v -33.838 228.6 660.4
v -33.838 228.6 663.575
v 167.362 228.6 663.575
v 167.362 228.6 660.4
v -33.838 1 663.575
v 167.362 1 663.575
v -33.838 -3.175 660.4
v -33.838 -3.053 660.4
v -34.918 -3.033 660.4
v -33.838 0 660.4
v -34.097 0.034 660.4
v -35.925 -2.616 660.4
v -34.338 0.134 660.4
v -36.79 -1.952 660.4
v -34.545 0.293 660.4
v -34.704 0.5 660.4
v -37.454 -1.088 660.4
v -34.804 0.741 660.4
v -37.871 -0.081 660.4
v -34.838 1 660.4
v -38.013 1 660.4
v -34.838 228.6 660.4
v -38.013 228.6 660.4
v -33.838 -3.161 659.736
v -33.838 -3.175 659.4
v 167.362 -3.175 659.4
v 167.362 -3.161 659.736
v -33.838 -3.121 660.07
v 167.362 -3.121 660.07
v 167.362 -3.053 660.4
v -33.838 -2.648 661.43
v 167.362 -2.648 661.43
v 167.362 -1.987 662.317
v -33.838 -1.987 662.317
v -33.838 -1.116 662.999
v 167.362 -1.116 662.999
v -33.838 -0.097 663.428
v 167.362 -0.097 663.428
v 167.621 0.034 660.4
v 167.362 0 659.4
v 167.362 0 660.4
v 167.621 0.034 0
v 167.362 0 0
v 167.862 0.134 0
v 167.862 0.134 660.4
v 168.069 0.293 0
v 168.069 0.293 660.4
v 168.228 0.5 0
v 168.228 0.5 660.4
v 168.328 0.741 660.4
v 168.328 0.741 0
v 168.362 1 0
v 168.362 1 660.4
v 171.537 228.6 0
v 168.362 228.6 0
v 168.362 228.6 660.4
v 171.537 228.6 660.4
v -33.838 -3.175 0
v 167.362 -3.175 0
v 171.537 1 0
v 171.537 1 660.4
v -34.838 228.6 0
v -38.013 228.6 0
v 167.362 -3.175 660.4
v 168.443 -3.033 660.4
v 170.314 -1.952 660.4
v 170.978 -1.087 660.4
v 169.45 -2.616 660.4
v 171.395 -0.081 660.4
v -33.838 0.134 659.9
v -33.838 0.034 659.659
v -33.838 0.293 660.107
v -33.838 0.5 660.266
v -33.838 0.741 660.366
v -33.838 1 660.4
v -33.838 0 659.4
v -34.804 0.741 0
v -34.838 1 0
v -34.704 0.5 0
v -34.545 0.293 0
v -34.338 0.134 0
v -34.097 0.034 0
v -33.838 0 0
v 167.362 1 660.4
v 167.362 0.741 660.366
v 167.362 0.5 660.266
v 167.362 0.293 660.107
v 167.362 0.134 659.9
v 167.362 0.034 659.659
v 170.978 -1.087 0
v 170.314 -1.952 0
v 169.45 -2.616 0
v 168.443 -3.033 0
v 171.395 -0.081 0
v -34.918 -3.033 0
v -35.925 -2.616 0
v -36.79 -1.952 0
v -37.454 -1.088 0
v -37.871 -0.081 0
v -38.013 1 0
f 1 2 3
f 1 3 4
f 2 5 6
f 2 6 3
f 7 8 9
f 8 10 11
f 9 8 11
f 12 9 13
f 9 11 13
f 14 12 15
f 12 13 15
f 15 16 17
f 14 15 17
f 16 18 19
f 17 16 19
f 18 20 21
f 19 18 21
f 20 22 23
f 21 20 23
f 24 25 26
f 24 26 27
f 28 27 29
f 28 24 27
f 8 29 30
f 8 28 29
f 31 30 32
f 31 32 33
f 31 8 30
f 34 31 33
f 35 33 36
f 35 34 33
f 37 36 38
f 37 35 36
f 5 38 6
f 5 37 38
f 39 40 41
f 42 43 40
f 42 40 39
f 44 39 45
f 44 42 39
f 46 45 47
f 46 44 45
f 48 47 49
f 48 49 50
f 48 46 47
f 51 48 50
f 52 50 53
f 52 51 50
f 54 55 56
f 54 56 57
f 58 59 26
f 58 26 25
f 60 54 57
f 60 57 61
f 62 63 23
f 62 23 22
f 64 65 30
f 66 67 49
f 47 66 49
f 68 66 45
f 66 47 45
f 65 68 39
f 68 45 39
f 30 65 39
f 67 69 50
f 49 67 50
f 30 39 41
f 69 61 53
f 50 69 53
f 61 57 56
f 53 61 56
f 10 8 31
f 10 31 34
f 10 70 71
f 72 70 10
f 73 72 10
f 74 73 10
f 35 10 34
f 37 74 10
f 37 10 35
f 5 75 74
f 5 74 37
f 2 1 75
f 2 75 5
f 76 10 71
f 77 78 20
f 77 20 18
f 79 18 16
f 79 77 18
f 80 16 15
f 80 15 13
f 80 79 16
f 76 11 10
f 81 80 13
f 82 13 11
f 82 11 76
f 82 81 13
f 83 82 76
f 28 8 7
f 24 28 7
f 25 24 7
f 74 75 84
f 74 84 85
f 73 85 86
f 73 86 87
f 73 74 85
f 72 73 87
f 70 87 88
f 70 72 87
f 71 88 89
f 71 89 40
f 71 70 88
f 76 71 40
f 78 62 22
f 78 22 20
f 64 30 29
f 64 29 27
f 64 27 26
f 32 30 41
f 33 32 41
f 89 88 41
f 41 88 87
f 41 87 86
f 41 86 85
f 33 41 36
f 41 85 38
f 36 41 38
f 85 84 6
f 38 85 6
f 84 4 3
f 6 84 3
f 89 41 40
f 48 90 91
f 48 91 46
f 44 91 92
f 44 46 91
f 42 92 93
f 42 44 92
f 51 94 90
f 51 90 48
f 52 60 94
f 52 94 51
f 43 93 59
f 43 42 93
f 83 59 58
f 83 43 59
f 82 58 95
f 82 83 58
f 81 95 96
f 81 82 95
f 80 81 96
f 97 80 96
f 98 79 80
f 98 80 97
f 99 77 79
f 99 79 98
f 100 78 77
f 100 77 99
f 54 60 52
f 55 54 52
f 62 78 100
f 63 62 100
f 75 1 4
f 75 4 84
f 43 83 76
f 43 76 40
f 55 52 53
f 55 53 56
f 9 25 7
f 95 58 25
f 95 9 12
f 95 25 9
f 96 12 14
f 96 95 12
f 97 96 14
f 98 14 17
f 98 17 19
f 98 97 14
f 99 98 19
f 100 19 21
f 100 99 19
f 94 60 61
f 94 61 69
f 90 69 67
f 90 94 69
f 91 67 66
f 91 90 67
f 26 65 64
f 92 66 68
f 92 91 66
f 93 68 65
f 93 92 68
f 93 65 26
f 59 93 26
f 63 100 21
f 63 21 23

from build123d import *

# Parameters (mm, degrees)
BASE_FLANGE1_DEPTH           = 660.4
EDGE_FLANGE1_STRIP_W         = 14.7
EDGE_FLANGE1_STRIP_H         = 3.175
EDGE_FLANGE1_STRIP_CUT_DEPTH = 201.2
EDGE_FLANGE1_DEPTH           = 201.2


# Sheet-metal steps are written as plain solids
with BuildPart() as part:
    # Sketch1 → Base-Flange1 (new body)
    with BuildSketch(Plane.XY):
        with BuildLine():
            Line((-34.837852286, 228.6), (-34.837852286, 1))
            ThreePointArc((-34.837852286, 1), (-34.544959068, 0.292893219), (-33.837852286, 0))
            Line((-33.837852286, 0), (167.362147714, 0))
            ThreePointArc((167.362147714, 0), (168.069254495, 0.292893219), (168.362147714, 1))
            Line((168.362147714, 1), (168.362147714, 228.6))
            Line((168.362147714, 228.6), (171.537147714, 228.6))
            Line((171.537147714, 228.6), (171.537147714, 1))
            ThreePointArc((171.537147714, 1), (170.314318525, -1.952170811), (167.362147714, -3.175))
            Line((167.362147714, -3.175), (-33.837852286, -3.175))
            ThreePointArc((-33.837852286, -3.175), (-36.790023098, -1.952170811), (-38.012852286, 1))
            Line((-38.012852286, 1), (-38.012852286, 228.6))
            Line((-38.012852286, 228.6), (-34.837852286, 228.6))
        make_face()
    extrude(amount=BASE_FLANGE1_DEPTH)

    # Edge-Flange1 strip (across the edge) → Edge-Flange1 strip cut (cut)
    with BuildSketch(Plane(origin=(-33.837852286, 0, 660.4), x_dir=(0, 0, -1), z_dir=(1, 0, 0))):
        with Locations((-6.35, -1.5875)):
            Rectangle(EDGE_FLANGE1_STRIP_W, EDGE_FLANGE1_STRIP_H)
    extrude(amount=EDGE_FLANGE1_STRIP_CUT_DEPTH, mode=Mode.SUBTRACT)

    # Edge-Flange1 section (across the edge) → Edge-Flange1 (add)
    with BuildSketch(Plane(origin=(-33.837852286, 0, 660.4), x_dir=(0, 0, -1), z_dir=(1, 0, 0))):
        with BuildLine():
            Line((-3.175, 1), (-3.175, 228.6))
            Line((-3.175, 228.6), (0, 228.6))
            Line((0, 228.6), (0, 1))
            ThreePointArc((0, 1), (0.292893219, 0.292893219), (1, 0))
            Line((1, 0), (1, -3.175))
            ThreePointArc((1, -3.175), (-1.952170811, -1.952170811), (-3.175, 1))
        make_face()
    extrude(amount=EDGE_FLANGE1_DEPTH)


solid = part.part
